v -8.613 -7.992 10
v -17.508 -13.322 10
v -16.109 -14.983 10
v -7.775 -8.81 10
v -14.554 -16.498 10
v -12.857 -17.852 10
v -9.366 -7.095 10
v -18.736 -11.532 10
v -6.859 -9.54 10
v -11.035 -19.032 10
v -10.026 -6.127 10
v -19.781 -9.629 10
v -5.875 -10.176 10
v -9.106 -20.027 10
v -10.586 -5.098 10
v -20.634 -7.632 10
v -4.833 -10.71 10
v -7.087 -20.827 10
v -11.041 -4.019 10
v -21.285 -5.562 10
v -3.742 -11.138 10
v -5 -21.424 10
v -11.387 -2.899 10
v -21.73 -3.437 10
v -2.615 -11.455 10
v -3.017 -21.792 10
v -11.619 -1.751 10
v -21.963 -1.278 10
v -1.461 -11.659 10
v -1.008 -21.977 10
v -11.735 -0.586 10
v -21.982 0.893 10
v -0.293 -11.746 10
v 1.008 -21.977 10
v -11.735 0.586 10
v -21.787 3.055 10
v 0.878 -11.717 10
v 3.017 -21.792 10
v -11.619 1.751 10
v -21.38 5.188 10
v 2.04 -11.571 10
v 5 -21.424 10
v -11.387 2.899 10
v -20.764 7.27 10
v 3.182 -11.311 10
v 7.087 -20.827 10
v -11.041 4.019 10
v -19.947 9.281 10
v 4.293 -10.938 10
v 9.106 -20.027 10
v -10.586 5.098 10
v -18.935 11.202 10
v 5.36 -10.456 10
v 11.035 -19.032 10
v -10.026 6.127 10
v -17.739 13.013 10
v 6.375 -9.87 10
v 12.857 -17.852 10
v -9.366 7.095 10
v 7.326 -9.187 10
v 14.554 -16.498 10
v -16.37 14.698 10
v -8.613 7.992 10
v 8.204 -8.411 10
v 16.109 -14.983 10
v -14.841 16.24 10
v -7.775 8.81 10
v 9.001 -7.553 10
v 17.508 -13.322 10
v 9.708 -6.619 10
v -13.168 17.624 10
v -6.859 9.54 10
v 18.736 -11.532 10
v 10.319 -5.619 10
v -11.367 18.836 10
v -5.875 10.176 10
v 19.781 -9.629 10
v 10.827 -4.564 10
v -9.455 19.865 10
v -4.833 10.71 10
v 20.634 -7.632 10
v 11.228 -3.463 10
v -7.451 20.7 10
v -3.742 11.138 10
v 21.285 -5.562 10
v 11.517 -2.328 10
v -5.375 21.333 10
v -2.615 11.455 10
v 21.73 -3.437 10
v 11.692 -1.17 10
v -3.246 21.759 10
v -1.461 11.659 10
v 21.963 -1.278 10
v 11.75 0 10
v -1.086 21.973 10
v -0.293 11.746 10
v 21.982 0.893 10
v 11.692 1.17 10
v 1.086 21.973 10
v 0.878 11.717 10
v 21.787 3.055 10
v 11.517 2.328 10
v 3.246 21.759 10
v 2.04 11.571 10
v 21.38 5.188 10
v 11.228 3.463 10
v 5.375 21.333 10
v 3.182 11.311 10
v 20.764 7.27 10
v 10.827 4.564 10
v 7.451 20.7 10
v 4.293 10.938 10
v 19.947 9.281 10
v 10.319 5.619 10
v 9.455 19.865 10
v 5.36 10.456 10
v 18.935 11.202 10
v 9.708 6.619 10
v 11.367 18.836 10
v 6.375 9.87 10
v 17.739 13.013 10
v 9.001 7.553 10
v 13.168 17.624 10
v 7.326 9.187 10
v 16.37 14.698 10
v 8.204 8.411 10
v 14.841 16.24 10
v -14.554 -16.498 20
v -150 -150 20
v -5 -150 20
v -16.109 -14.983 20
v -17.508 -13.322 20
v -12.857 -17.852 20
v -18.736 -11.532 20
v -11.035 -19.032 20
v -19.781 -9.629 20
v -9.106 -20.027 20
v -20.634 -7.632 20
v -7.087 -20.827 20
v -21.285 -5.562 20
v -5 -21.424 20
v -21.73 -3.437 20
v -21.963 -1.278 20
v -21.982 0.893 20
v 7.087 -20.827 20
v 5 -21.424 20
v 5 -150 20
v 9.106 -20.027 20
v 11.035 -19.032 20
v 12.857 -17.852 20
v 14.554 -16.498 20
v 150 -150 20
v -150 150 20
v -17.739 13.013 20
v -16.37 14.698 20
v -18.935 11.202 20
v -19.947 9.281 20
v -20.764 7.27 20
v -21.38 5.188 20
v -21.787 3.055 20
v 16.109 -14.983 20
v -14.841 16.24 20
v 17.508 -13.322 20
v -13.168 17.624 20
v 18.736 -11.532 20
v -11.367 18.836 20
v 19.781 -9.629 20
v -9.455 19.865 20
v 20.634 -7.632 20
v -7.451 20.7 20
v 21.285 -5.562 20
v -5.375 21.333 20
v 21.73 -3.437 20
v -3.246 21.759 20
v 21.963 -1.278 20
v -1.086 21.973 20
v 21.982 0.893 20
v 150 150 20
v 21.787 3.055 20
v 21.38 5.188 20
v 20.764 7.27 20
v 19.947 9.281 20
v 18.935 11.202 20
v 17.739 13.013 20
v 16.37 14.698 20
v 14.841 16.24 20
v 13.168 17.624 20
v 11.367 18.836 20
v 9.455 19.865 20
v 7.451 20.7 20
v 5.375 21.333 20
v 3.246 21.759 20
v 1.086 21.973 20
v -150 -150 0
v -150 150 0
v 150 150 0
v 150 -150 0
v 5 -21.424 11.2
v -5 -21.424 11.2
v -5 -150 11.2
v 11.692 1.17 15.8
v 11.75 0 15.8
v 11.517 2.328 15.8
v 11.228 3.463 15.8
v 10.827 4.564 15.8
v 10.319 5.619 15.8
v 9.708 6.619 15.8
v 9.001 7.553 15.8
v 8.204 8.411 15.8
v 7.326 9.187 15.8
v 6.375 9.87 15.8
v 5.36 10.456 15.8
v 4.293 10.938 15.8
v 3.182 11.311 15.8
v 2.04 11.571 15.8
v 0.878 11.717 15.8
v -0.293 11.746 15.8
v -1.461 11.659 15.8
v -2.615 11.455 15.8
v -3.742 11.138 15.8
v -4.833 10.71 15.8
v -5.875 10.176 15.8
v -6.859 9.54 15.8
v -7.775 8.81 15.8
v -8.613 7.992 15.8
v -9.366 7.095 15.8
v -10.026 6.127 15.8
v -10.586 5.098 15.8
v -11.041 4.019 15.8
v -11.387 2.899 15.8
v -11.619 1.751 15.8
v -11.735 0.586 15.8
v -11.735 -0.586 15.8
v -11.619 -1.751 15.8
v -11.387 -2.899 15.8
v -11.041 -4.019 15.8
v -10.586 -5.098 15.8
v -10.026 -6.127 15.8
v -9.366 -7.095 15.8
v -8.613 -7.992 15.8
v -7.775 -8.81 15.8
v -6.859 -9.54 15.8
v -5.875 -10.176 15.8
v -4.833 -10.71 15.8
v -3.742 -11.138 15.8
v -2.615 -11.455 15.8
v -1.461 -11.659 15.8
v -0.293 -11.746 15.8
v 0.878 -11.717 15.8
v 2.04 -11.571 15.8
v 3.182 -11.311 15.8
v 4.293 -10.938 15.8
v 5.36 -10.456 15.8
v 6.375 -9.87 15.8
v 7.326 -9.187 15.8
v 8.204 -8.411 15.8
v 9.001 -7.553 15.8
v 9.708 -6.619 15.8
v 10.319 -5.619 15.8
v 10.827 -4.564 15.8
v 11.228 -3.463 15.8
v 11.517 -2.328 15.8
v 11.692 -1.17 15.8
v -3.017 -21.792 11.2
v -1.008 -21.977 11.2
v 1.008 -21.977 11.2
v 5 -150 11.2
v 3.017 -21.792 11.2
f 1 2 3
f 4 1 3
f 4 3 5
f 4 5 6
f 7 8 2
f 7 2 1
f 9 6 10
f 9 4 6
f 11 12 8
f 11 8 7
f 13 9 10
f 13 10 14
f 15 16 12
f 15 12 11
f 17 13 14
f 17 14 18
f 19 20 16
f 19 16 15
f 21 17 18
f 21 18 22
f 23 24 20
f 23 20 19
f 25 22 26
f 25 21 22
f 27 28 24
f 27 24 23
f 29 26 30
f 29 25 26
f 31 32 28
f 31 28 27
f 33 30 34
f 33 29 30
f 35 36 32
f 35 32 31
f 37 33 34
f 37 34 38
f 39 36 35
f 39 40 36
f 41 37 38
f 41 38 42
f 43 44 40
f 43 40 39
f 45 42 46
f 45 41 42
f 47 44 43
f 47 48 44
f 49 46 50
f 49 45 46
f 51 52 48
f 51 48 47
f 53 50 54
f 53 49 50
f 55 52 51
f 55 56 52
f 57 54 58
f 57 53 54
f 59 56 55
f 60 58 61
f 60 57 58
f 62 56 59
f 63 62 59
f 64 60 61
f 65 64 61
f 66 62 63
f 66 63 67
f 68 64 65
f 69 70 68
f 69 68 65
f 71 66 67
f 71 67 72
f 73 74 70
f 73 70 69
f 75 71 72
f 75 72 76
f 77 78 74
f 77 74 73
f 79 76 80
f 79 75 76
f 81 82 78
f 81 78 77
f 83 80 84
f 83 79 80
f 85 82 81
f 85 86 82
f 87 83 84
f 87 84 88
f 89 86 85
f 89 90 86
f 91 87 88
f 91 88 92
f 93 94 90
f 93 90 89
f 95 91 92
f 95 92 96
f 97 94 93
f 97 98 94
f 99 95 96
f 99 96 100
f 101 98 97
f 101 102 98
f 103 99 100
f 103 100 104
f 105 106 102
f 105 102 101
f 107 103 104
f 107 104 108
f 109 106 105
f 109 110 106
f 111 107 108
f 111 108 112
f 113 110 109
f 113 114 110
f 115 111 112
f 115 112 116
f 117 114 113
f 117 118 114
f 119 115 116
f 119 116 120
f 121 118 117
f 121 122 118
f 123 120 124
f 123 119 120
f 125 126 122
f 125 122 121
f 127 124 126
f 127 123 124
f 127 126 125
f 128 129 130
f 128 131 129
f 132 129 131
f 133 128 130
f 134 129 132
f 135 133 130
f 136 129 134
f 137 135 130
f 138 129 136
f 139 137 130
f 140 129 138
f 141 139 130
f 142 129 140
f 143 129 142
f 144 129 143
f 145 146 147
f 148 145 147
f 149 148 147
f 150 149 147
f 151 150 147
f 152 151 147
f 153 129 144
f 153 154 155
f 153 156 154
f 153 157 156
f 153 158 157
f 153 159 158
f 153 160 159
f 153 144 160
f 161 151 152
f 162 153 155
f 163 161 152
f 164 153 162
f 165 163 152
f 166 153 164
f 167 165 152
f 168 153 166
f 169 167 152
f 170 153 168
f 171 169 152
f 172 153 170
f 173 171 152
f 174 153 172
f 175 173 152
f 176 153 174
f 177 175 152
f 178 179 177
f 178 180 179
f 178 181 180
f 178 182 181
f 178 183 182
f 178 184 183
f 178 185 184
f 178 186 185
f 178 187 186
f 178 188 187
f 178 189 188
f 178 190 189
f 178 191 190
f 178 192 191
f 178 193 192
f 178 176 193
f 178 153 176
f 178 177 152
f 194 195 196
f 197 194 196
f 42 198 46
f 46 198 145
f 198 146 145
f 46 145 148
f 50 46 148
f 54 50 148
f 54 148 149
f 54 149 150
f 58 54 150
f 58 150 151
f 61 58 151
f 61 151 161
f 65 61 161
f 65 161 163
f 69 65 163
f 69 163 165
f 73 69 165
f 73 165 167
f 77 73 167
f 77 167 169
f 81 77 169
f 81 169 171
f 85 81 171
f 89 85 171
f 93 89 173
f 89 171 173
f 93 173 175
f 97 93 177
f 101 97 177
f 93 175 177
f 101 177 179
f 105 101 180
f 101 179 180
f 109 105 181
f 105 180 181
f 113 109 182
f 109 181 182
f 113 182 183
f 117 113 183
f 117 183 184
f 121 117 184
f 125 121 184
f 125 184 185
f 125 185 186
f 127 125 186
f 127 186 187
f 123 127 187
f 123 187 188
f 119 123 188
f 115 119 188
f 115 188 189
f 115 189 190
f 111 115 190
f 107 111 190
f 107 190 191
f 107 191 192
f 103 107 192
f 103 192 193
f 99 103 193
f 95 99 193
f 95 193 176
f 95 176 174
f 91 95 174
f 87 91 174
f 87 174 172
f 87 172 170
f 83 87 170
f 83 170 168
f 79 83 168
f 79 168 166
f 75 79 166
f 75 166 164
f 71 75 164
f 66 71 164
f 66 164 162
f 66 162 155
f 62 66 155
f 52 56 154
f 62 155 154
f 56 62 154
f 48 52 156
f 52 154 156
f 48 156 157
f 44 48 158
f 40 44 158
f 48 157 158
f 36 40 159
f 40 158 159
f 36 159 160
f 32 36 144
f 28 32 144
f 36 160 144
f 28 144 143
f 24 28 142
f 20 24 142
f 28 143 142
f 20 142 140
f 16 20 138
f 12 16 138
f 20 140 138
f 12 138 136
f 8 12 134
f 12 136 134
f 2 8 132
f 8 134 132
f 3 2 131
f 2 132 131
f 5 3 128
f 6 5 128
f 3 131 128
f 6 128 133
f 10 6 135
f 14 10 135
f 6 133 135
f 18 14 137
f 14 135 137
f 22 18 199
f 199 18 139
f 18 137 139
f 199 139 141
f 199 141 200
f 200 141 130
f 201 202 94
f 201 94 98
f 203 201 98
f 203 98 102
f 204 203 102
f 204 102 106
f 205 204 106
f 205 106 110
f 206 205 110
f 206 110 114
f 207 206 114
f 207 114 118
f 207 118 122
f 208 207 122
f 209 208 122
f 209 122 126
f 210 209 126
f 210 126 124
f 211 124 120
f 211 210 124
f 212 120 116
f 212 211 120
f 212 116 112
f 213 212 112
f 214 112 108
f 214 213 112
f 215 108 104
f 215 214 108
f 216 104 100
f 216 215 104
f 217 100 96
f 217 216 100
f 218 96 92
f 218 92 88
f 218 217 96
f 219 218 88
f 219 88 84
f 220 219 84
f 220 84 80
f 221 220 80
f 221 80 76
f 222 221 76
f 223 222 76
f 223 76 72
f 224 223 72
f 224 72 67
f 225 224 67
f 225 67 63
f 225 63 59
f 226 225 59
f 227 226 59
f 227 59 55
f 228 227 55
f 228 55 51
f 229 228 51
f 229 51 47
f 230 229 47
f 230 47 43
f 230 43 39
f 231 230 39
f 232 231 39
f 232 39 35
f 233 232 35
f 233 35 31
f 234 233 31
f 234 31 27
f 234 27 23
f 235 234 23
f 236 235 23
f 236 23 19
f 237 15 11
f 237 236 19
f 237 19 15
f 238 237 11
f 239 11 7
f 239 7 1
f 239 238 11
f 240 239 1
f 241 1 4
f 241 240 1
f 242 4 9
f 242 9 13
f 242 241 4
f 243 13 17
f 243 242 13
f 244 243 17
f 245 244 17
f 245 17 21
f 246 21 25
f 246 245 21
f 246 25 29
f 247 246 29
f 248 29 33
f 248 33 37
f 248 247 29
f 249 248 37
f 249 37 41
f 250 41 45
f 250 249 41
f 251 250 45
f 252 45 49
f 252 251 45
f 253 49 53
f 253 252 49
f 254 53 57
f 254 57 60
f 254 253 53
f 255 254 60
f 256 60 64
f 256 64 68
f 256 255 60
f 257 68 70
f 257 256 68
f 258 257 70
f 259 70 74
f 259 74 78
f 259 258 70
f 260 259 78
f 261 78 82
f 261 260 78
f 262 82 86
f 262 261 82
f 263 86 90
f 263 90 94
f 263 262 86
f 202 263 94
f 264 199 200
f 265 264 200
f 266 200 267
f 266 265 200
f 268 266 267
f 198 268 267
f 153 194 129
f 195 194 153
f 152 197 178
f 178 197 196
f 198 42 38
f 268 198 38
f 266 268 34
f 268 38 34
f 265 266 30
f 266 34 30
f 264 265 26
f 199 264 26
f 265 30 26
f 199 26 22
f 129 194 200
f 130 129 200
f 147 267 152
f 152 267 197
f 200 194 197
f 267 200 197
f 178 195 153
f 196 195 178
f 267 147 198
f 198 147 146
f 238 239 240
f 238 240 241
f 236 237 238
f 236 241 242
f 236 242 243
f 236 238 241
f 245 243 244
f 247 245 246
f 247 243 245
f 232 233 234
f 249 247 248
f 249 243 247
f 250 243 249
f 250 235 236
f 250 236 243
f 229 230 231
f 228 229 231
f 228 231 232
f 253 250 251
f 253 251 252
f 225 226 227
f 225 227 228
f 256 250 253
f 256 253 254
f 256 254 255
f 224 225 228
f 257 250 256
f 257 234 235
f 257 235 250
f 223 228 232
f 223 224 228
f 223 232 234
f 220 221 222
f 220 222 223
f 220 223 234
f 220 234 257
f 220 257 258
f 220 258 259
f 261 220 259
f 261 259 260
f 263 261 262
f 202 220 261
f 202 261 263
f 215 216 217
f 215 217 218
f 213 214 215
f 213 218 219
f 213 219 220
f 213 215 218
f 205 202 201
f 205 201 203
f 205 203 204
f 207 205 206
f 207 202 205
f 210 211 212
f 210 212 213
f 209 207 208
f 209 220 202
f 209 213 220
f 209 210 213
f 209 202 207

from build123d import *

# Parameters (mm, degrees)
F0_W     = 300
F0_H     = 300
F1_DEPTH = 20
F2_R     = 11.75
F3_DEPTH = 10
F4_DEPTH = 8.8
F6_DEPTH = 1.2
F7_DEPTH = 4.2


with BuildPart() as f1:
    # F0 (on Top) → F1 (new body)
    with BuildSketch(Plane.XY):
        Rectangle(F0_W, F0_H)
    extrude(amount=F1_DEPTH)

    # F2 (on face) → F3 (cut)
    with BuildSketch(Plane.XY.offset(20)):
        with BuildLine():
            Line((-5, -21.4242852856), (-5, -150))
            Line((-5, -150), (5, -150))
            Line((5, -150), (5, -21.4242852856))
            ThreePointArc((5, -21.4242852856), (0, 22), (-5, -21.4242852856))
        make_face()
        Circle(F2_R, mode=Mode.SUBTRACT)
    extrude(amount=-F3_DEPTH, mode=Mode.SUBTRACT)

    # F2 (on face) → F4 (cut)
    with BuildSketch(Plane.XY.offset(20)):
        with BuildLine():
            Line((-5, -21.4242852856), (-5, -150))
            Line((-5, -150), (5, -150))
            Line((5, -150), (5, -21.4242852856))
            ThreePointArc((5, -21.4242852856), (0, 22), (-5, -21.4242852856))
        make_face()
        Circle(F2_R, mode=Mode.SUBTRACT)
    extrude(amount=-F4_DEPTH, mode=Mode.SUBTRACT)

    # F5 (on face) → F6 (join)
    with BuildSketch(Plane.XY.offset(10)):
        with BuildLine():
            ThreePointArc((5, -21.4242852856), (0, -22), (-5, -21.4242852856))
            Line((-5, -21.4242852856), (-5, -150))
            Line((-5, -150), (5, -150))
            Line((5, -150), (5, -21.4242852856))
        make_face()
    extrude(amount=F6_DEPTH)

    # F2 (on face) → F7 (cut)
    with BuildSketch(Plane.XY.offset(20)):
        Circle(F2_R)
    extrude(amount=-F7_DEPTH, mode=Mode.SUBTRACT)


solid = f1.part
